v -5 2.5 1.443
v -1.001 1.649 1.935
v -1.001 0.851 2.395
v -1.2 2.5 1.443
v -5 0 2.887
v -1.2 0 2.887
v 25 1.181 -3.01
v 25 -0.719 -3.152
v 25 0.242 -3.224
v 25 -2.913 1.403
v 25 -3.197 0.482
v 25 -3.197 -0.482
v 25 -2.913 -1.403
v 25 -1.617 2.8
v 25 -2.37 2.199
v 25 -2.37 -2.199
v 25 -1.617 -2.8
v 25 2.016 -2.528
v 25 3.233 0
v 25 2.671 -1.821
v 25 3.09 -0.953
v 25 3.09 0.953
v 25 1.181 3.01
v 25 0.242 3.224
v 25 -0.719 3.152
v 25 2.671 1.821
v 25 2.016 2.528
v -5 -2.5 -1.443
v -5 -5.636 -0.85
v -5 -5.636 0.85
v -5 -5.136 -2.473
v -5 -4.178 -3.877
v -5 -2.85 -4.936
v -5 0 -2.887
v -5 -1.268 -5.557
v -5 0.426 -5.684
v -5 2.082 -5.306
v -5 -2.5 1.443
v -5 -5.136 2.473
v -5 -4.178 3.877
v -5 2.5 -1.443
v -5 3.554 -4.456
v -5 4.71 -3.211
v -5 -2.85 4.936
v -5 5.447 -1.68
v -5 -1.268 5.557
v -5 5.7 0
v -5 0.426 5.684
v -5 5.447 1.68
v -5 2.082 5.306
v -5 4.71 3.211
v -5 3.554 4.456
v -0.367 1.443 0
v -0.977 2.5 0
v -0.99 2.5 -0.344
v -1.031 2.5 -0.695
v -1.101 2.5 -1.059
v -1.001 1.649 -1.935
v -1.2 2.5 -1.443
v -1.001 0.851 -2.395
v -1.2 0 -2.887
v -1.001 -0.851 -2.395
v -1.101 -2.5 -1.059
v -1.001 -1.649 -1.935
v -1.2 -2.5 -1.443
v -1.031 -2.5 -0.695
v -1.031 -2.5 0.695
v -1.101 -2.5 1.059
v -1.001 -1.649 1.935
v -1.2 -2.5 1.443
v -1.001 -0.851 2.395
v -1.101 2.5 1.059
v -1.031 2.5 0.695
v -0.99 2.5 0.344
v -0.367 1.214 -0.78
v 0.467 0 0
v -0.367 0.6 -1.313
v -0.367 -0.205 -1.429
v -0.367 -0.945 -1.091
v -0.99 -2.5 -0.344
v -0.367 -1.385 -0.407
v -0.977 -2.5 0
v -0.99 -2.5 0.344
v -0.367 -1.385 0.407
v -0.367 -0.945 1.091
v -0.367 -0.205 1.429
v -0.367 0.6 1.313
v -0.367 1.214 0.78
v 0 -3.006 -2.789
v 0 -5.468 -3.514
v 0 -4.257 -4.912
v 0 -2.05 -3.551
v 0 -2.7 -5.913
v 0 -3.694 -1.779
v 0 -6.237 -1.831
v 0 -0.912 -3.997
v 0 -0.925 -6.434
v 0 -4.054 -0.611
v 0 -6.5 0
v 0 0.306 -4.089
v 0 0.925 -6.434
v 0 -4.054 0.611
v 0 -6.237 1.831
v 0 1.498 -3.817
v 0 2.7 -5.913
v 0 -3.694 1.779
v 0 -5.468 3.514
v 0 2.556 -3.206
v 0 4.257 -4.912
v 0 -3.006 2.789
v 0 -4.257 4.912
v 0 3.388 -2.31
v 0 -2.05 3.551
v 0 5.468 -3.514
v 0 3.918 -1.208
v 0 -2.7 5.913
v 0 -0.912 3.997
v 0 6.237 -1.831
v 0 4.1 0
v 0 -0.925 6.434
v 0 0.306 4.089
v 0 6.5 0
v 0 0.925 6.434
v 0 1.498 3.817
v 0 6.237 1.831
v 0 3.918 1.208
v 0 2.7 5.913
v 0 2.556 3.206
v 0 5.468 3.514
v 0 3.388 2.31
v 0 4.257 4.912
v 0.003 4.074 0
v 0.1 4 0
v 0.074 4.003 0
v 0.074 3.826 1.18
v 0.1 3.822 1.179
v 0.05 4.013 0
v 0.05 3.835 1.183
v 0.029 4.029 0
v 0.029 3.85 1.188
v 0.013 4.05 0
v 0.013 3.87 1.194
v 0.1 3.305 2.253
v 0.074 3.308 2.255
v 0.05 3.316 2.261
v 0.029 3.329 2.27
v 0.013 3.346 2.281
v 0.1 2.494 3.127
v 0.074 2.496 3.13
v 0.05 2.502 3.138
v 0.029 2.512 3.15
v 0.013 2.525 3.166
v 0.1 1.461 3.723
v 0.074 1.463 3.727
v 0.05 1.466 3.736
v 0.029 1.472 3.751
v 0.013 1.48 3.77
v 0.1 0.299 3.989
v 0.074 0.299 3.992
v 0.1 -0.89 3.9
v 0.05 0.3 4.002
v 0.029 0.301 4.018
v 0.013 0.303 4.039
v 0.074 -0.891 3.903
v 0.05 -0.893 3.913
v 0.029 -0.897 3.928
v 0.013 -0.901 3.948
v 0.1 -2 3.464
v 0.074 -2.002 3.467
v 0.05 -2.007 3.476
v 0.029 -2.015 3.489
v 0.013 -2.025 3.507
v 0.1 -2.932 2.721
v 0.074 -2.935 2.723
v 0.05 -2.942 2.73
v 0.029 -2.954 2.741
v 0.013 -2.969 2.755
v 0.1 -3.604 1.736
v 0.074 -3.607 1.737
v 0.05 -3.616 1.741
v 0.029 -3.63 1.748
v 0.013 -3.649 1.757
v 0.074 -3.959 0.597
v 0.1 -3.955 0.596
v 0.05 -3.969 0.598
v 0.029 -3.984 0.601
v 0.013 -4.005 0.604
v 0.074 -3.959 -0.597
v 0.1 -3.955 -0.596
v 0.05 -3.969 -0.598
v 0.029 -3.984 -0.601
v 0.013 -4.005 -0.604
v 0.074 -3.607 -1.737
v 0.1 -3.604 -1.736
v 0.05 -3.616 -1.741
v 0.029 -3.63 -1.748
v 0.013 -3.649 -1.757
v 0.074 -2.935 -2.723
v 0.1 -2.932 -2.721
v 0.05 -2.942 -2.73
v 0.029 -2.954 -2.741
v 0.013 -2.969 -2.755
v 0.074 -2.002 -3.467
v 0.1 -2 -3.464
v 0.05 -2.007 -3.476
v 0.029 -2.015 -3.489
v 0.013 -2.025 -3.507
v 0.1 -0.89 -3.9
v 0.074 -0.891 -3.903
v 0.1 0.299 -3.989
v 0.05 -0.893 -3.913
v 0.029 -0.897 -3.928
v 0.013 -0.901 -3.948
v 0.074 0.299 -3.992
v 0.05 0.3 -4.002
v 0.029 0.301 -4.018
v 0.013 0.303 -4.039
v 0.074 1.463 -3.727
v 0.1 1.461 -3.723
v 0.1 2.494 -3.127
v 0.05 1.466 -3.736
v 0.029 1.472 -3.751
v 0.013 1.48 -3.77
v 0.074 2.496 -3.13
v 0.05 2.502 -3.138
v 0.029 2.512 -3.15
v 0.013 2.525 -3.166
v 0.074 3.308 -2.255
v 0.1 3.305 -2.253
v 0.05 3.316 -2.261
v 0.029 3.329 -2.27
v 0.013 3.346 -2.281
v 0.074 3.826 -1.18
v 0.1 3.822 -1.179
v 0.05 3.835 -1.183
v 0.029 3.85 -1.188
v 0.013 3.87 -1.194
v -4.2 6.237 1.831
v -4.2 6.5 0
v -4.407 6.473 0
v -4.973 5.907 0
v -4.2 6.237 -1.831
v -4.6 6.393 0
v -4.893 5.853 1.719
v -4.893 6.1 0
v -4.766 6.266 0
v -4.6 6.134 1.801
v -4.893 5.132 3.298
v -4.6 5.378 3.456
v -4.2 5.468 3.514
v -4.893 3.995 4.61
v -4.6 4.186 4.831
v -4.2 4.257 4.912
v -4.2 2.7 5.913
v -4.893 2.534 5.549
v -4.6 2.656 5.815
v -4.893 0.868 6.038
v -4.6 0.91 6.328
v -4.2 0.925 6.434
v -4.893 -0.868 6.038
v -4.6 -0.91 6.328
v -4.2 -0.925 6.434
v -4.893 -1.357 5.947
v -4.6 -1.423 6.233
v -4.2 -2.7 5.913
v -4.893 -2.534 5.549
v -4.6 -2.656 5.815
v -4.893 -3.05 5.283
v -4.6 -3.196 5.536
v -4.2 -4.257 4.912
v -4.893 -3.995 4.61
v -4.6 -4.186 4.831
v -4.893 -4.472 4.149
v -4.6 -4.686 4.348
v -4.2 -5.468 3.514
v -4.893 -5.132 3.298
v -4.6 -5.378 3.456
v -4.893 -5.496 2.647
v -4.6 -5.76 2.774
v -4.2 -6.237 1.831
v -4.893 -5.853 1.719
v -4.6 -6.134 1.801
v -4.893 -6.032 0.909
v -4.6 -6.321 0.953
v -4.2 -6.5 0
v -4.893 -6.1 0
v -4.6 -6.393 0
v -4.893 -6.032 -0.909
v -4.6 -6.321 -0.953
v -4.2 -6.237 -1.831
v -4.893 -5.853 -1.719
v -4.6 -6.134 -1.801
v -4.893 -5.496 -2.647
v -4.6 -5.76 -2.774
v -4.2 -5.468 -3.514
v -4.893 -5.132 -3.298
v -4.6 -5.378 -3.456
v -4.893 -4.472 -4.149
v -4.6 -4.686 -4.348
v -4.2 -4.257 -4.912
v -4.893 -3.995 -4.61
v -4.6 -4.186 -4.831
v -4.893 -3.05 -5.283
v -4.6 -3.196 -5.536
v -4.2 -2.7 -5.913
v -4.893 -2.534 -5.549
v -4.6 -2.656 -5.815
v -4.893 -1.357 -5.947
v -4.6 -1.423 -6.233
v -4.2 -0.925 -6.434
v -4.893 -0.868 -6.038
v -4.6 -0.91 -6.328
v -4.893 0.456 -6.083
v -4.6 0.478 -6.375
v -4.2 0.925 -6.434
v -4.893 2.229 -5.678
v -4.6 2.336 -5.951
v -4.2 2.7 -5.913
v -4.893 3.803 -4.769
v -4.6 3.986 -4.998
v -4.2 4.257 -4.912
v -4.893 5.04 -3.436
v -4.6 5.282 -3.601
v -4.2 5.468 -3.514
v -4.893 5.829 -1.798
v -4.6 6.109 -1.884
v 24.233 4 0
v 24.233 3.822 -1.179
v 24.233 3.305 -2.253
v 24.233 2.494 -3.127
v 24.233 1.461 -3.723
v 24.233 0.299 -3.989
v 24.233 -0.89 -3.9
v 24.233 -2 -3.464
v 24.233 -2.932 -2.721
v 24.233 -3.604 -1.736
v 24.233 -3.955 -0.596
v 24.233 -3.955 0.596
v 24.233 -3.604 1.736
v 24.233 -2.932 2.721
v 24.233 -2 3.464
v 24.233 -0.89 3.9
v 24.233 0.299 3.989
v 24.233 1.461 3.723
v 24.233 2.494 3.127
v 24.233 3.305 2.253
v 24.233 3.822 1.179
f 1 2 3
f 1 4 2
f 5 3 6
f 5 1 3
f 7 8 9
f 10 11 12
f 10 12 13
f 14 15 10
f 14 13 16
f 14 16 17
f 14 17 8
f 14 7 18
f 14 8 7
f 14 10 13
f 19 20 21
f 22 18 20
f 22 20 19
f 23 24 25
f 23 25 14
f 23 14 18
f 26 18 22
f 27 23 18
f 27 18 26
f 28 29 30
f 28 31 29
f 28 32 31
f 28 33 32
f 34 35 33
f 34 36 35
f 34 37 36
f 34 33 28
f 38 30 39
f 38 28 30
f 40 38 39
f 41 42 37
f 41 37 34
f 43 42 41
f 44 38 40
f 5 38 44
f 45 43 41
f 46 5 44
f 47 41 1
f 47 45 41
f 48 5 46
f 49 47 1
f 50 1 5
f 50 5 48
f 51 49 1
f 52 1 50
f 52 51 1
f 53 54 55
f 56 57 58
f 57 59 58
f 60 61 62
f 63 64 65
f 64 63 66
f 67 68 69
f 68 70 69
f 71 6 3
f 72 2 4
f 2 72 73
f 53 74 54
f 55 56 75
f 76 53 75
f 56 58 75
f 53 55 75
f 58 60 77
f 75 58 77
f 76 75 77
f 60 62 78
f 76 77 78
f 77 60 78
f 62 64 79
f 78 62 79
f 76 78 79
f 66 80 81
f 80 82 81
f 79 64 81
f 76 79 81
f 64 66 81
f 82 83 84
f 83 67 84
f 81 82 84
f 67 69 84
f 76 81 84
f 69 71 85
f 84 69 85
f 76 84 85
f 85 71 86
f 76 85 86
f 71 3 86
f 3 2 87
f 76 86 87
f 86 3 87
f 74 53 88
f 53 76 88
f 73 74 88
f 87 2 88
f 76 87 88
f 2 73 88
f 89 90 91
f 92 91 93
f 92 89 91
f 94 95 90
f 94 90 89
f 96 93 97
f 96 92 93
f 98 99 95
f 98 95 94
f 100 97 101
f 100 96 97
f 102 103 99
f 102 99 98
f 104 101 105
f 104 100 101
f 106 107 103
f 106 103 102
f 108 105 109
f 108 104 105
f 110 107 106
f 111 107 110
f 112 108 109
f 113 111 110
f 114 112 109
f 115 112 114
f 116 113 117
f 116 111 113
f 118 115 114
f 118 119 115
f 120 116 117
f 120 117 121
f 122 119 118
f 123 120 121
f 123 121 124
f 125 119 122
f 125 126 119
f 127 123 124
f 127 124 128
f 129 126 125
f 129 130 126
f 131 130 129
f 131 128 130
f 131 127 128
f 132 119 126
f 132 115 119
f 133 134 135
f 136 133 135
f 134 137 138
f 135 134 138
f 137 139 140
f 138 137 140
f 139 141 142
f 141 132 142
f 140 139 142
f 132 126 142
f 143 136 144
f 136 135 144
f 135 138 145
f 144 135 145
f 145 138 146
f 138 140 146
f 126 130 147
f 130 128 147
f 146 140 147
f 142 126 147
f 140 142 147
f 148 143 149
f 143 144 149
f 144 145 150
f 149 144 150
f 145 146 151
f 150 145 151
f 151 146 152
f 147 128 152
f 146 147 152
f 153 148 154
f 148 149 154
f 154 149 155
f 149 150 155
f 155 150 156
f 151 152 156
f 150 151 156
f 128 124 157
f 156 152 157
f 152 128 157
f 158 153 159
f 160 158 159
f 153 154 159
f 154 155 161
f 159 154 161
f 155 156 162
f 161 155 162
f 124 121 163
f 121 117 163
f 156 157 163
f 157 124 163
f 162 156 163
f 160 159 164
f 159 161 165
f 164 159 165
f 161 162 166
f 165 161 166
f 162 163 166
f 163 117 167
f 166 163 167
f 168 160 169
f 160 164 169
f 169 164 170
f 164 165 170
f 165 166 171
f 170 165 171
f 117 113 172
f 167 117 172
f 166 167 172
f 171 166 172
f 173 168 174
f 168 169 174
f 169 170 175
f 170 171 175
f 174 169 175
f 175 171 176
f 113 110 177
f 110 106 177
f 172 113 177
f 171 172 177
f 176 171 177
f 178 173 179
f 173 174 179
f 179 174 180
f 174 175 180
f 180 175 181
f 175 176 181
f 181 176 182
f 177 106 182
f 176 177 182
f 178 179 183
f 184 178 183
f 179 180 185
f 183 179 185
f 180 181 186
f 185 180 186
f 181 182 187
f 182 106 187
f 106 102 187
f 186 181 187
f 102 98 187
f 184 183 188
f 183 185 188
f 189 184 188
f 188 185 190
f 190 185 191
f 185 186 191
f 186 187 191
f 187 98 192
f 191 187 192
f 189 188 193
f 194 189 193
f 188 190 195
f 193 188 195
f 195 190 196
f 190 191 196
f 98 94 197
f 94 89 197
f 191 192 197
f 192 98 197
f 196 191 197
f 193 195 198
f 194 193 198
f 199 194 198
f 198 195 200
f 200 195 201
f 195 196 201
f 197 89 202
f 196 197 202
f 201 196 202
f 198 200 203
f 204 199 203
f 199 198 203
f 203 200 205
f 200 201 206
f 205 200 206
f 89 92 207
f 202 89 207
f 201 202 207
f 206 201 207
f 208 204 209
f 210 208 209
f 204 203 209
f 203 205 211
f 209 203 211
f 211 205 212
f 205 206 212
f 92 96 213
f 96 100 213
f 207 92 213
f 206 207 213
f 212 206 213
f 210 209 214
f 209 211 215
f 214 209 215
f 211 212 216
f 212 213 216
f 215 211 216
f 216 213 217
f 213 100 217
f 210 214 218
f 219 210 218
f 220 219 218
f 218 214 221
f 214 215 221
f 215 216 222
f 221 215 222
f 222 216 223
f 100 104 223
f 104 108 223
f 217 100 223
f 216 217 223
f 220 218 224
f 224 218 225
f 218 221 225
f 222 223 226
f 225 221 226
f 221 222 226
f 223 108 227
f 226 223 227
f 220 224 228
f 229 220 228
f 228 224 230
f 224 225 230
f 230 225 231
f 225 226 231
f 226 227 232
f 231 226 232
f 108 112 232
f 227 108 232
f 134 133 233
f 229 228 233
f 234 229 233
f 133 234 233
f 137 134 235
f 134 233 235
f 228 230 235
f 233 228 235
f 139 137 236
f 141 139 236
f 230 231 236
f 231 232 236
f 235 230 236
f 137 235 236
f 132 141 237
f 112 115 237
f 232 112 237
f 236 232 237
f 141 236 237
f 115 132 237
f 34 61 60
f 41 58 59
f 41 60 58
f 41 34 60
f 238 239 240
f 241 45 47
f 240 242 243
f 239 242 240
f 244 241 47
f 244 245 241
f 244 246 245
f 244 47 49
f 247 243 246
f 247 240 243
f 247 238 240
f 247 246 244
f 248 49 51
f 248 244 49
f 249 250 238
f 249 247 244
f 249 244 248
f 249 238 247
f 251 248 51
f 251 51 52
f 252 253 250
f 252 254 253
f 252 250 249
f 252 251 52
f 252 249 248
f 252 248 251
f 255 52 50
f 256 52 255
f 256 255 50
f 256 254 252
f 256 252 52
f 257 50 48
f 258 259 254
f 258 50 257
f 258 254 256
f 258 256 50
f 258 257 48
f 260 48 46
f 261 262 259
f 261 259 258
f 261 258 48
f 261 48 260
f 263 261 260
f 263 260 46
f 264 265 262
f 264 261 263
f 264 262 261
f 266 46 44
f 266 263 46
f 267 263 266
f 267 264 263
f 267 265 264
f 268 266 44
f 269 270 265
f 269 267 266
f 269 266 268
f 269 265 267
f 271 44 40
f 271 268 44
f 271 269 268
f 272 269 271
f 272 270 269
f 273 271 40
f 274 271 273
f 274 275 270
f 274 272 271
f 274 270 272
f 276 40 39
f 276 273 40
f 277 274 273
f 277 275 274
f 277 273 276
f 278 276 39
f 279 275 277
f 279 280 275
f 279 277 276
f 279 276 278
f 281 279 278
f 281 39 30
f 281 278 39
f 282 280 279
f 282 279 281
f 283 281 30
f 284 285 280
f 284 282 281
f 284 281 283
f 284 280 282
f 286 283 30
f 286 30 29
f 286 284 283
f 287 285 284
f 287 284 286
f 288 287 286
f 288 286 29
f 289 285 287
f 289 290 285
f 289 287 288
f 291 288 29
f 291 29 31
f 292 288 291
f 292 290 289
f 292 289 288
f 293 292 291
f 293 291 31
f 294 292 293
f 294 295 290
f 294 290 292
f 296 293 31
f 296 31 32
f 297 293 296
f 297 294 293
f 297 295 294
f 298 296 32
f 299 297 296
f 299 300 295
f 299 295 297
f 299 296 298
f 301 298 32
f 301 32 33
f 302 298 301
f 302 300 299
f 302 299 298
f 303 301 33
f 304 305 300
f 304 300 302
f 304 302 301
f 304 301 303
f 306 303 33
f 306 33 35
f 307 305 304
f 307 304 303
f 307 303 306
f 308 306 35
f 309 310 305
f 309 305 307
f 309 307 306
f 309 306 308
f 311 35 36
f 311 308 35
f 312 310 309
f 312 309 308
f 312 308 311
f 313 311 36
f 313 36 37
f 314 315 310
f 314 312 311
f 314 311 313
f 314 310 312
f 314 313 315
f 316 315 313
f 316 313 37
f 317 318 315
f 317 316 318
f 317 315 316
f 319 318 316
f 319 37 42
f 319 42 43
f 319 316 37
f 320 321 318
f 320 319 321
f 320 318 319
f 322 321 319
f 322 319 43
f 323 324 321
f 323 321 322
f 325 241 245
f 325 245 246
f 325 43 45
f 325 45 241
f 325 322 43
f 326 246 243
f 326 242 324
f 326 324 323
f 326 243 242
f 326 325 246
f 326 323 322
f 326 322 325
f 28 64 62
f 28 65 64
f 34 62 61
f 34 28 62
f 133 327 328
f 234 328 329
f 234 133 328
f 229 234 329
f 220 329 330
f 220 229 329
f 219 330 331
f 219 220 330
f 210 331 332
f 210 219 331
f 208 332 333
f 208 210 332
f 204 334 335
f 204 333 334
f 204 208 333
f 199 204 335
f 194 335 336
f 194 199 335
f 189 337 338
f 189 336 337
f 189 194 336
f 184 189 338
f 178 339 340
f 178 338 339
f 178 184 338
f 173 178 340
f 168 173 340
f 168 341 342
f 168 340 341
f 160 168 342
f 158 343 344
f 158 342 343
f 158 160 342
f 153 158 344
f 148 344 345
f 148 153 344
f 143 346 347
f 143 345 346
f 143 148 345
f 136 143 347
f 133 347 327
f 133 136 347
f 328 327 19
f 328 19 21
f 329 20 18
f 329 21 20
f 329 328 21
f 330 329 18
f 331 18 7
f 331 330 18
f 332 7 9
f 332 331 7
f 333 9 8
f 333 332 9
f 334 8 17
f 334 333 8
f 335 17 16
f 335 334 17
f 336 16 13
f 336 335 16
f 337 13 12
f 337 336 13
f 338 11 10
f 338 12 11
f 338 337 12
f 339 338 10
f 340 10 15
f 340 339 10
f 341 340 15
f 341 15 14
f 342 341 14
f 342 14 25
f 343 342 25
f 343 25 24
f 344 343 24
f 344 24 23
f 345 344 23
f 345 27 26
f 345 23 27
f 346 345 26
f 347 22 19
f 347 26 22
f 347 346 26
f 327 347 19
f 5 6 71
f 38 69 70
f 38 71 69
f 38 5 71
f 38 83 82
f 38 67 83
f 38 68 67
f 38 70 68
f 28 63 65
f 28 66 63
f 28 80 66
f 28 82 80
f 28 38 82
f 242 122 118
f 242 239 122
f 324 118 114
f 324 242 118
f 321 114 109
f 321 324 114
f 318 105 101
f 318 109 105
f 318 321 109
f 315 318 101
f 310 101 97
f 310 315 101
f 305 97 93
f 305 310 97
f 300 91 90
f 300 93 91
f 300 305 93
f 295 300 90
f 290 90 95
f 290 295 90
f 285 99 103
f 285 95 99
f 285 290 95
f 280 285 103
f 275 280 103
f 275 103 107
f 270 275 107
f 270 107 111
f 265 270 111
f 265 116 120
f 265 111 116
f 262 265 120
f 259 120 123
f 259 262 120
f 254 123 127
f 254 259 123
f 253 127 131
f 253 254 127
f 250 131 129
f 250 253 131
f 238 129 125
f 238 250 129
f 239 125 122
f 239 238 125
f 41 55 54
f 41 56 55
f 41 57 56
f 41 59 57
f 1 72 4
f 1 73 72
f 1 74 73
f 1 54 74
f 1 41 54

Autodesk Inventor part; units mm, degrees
ref_plane "YZ Plane" through (0, 0, 0) normal (1, 0, 0) x (0, 1, 0)
ref_plane "XZ Plane" through (0, 0, 0) normal (0, 1, 0) x (-1, 0, 0)
sketch "Sketch1" plane through (0, 0, 0) normal (0, 0, 1) x (1, 0, 0)
  line L0 (0.4667, 0) -> (25, 0)
  line L1 (25, 0) -> (25, 4)
  line L2 (25, 4) -> (3.75, 4)
  line L3 (3.75, 4) -> (2.9831, 4)
  line L4 (2.9831, 4) -> (0, 4)
  line L5 (0, 4) -> (0, 6.5)
  line L6 (0, 6.5) -> (-5, 6.5)
  line L7 (-5, 6.5) -> (-5, 2.8868)
  line L8 (-5, 2.8868) -> (-1.2, 2.8868)
  line L9 (-1.2, 2.8868) -> (0.4667, 0)
  line L10 (-11, 0) -> (31, 0) projected
  line L11 (0, -1.3) -> (0, 7.8) projected
  line L12 (3.75, 4) -> (0, 4) construction
  dimension "d1" = 21.25
  dimension "d2" = 0.7669
  dimension "d3" = 5
  dimension "d4" = 3.8
  dimension "d5" = 60
  dimension "d6" = 8
  dimension "d7" = 8
  dimension "d8" = 5.7735
  dimension "d9" = 13
  dimension "d26" = 25
revolve "Body" add sketch "Sketch1" angle 360 about axis through (0.4667, 0, 0) along (1, 0, 0) contours L9 L11 L4 L3 L2 L1 L0 | L9 L8 L7 L6 L5 L11
sketch "Sketch2" plane through (-5, 0, 0) normal (-1, 0, 0) x (0, 0, 1)
  circle A0 centre (0, 0) radius 2.8868 projected
  line L0 (0, -9.1) -> (0, 9.1) projected
  line L1 (-9.1, 0) -> (9.1, 0) projected
  line L2 (2.8868, 0) -> (1.4434, -2.5)
  line L3 (1.4434, -2.5) -> (-1.4434, -2.5)
  line L4 (-1.4434, -2.5) -> (-2.8868, 0)
  line L5 (-2.8868, 0) -> (-1.4434, 2.5)
  line L6 (-1.4434, 2.5) -> (1.4434, 2.5)
  line L7 (1.4434, 2.5) -> (2.8868, 0)
  point P0 (0, 0)
extrude "Slot" add sketch "Sketch2" against normal up to next contours L7 A0 | A0 L2 | L6 L0 A0 | A0 L0 L3 | L0 L6 A0 | A0 L3 L0 | L4 A0 | A0 L5
fillet "Fillet1" radius 0.8 1 edges at (-5, -6.5, 0)
thread "Thread" size "M8x1.25" class "6g" standard "ISO Metric profile" length 21.25
chamfer "Chamfer1" distance 0.7668 distance2 0.7668 1 edges at (25, -4, 0) measured on face at (25, -0.6859, 0.8072)
ref_plane "Work Plane1" through (29, 0, 0) normal (0, -1, 0) x (1, 0, 0)
fillet "Fillet2" radius 0.1 1 edges at (0, -4, 0)
equation "\"d1\" = GEL"
equation "\"d3\" = KOH"
equation "\"d4\" = INTI"
equation "\"d6\" = GD"
equation "\"d7\" = BDM"
equation "\"d8\" = 1.1547 * SW"
equation "\"d9\" = KOD"
equation "\"d26\" = NLG"
equation "\"d30\" = R"
equation "\"d17\" = RR"
equation "\"d13\" = GEL"
equation "\"d15\" = -0.5 * SPD + 0.5 * GD"
equation "\"d16\" = GUL"
equation "\"GD\" = NND"
equation "\"NLG\" = 25"
equation "\"GEL\" = 21.25"
equation "\"KOD\" = 13"
equation "\"KOH\" = 5"
equation "\"INTI\" = 3.8"
equation "\"GAL\" = 0.61345 * PTC"
equation "\"GUL\" = 0.61345 * PTC"
equation "\"BDM\" = NND"
equation "\"SW\" = 5"
equation "\"RR\" = 0.8"
equation "\"SPD\" = NND - 1.2269 * PTC"
equation "\"R\" = 0.1"
equation "\"TOA\" = 30deg"
equation "\"GD1\" = THREADDIA - 1.2269 * PTC"
equation "\"THREADDIA\" = 8"
equation "\"FAWI\" = 45deg"
equation "\"ANG\" = 120deg"
equation "\"PTC\" = 1.25"
equation "\"NND\" = 8"
equation "\"E0\" = 1.155 * SW"
properties part number "DIN 7984 - M8 x 25" material "Steel, Mild"
